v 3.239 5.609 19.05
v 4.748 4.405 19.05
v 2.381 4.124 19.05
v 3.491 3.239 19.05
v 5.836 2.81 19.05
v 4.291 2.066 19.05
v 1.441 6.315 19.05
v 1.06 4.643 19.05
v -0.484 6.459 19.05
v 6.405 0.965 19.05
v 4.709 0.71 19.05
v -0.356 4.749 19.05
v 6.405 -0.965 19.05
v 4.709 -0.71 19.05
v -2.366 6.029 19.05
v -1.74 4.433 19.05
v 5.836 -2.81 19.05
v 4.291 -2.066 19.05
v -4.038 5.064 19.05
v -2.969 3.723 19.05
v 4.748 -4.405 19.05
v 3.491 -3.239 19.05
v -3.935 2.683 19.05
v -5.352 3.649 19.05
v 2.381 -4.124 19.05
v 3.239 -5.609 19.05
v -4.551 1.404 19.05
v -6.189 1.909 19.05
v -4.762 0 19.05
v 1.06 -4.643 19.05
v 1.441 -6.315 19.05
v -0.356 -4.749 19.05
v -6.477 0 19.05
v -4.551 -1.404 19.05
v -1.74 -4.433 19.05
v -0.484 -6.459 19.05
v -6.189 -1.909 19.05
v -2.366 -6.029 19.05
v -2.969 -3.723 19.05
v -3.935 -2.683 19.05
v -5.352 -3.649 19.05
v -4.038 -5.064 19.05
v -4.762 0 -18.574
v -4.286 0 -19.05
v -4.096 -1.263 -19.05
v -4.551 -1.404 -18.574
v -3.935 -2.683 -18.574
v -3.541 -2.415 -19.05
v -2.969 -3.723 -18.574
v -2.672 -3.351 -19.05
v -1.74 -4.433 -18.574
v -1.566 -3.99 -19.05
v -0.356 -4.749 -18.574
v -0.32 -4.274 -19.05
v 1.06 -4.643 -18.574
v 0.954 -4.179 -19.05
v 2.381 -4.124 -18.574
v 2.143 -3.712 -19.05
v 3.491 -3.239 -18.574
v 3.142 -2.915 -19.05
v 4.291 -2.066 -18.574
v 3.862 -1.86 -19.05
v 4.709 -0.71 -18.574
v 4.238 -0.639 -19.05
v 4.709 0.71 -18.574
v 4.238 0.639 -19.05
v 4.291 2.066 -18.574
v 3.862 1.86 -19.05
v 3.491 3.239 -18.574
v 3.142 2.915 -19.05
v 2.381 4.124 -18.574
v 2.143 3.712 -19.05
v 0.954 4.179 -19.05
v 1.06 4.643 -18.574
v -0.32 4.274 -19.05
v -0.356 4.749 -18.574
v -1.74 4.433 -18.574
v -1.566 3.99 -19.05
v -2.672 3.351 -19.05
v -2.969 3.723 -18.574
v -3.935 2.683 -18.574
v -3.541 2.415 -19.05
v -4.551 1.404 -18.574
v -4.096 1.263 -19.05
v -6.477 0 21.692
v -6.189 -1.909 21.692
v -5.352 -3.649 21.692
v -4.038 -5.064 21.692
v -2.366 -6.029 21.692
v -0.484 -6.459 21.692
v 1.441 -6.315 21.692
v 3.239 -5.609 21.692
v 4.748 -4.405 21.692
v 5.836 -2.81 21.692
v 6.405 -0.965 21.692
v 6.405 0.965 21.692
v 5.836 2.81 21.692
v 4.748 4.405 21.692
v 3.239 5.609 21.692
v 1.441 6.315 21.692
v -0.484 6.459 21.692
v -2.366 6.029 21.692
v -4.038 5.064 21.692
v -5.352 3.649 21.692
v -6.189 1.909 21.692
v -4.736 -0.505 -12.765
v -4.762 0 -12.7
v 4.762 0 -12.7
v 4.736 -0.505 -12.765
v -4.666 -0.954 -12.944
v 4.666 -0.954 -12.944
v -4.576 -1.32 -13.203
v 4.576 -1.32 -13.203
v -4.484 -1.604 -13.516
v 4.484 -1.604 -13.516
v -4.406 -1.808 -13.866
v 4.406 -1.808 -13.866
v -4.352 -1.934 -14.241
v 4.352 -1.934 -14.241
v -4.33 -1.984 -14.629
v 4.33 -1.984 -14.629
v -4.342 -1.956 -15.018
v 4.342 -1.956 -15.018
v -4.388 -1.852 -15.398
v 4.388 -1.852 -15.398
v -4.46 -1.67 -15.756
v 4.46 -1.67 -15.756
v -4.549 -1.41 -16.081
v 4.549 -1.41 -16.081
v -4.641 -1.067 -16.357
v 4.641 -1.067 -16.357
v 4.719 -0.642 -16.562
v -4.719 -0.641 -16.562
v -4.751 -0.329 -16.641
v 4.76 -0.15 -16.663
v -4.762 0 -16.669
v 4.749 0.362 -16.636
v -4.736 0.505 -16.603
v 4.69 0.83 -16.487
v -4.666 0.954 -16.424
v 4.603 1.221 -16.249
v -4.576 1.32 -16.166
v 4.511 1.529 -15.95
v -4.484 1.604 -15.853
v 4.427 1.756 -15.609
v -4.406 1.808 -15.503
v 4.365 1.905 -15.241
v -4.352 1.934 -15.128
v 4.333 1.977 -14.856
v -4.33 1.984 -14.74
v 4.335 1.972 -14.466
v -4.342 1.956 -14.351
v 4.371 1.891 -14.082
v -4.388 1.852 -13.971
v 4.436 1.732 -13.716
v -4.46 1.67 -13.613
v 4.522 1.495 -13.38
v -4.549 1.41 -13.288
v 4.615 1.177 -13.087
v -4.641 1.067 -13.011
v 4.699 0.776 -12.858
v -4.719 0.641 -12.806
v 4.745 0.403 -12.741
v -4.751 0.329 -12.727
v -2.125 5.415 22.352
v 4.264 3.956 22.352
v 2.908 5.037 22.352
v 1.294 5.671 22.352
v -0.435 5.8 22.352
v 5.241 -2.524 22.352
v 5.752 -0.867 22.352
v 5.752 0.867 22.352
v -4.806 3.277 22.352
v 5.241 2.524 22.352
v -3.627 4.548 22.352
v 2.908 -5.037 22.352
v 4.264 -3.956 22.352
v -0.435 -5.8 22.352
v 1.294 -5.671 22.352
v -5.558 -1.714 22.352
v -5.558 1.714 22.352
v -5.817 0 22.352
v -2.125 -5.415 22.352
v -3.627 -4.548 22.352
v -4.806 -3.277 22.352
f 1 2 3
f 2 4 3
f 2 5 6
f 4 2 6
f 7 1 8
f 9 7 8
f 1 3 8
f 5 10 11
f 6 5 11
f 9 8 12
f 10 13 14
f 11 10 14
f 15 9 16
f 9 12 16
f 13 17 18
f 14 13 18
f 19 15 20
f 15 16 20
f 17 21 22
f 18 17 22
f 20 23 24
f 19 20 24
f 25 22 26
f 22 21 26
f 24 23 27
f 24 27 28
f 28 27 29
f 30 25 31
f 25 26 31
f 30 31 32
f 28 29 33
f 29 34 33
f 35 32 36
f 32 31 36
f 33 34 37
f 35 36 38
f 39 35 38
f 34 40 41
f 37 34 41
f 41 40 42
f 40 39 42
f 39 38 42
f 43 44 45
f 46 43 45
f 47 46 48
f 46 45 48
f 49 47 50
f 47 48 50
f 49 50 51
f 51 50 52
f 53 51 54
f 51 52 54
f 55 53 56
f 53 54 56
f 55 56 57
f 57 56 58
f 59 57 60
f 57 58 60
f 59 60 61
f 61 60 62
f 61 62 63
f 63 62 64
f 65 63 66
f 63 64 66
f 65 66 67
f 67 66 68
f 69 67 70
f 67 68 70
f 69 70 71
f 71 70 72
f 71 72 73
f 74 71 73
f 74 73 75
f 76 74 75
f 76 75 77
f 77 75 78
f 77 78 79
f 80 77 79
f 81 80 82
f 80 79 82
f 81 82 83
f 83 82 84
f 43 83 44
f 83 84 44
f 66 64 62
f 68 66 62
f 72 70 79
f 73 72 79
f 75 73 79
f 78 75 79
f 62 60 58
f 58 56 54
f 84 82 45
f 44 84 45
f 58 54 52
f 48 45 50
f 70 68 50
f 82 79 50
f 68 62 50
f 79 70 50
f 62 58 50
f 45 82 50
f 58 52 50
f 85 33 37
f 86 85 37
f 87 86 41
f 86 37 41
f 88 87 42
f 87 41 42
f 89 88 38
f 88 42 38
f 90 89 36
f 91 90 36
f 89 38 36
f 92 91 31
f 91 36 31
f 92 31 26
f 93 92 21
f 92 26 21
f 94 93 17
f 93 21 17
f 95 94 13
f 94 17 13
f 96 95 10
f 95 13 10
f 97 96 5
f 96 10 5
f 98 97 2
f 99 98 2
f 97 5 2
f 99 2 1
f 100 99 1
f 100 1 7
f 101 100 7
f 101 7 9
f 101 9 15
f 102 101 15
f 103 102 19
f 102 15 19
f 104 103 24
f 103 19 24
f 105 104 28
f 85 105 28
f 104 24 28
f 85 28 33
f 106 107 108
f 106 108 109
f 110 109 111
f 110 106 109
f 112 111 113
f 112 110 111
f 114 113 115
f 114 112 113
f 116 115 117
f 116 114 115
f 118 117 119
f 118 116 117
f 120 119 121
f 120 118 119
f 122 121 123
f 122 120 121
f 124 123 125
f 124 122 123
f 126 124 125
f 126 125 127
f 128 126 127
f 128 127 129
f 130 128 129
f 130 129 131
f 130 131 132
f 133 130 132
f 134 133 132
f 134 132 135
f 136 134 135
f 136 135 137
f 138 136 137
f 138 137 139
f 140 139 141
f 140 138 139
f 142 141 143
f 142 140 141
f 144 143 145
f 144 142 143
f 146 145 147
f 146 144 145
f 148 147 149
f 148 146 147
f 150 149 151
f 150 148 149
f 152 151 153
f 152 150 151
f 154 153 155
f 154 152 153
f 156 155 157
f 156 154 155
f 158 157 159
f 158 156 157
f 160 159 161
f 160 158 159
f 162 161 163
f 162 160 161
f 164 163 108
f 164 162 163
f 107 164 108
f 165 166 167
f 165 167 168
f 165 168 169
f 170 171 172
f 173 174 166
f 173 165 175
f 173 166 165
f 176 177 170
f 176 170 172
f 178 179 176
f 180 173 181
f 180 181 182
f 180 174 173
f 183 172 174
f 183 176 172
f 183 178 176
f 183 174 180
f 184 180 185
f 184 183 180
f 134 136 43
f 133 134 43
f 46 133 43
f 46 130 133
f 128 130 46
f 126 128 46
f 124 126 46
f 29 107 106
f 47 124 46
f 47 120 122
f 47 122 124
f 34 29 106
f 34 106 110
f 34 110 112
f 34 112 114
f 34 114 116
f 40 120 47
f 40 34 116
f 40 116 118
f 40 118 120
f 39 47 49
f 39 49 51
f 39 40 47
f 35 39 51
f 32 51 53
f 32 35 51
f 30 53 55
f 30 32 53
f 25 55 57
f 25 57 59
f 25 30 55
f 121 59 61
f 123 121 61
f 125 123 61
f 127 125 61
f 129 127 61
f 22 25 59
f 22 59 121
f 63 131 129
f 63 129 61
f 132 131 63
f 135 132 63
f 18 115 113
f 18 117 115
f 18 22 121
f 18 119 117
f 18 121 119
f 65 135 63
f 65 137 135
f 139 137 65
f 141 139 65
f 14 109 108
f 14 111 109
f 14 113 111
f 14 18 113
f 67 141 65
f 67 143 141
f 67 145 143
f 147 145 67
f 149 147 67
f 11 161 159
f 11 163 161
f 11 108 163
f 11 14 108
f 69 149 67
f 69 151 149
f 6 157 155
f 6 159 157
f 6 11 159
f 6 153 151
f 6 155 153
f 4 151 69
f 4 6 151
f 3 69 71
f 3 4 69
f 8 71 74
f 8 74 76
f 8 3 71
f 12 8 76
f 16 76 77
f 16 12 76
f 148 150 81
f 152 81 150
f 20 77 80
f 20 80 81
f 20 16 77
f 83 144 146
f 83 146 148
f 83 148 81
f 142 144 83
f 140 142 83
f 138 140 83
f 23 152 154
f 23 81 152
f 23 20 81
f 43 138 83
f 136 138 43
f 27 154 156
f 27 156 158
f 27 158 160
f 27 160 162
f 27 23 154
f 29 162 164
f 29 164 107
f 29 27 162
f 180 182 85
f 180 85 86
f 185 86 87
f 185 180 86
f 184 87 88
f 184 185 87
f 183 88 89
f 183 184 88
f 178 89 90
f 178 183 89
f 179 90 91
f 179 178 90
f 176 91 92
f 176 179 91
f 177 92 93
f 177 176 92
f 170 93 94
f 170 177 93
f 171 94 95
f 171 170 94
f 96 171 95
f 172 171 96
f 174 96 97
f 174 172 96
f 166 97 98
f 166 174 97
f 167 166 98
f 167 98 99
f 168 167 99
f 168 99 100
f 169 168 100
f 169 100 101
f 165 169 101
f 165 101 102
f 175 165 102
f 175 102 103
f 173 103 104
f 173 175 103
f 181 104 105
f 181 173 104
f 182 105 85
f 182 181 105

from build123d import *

# Parameters (mm, degrees)
SKETCH1_R           = 4.7625
EXTRUDE1_DEPTH      = 19.05
SKETCH2_R           = 6.477
EXTRUDE2_DEPTH      = 3.302
CHAMFER1_SIZE       = 0.6604
EXTRUDE3_DEPTH      = 25.156054355
EXTRUDE3_DEPTH_BACK = 25.156054355
SKETCH3_R           = 1.984375
CHAMFER2_SIZE       = 0.47625


with BuildPart() as part:
    # Sketch1 → Extrude1 (new, symmetric)
    with BuildSketch(Plane.XY):
        with Locations(Location((0, 0, 0), (0, 0, 180))):
            Circle(SKETCH1_R)
    extrude(amount=EXTRUDE1_DEPTH, both=True)

    # Sketch2 → Extrude2 (add)
    with BuildSketch(Plane.XY.offset(19.05)):
        with Locations(Location((0, 0, 0), (0, 0, 180))):
            Circle(SKETCH2_R)
    extrude(amount=EXTRUDE2_DEPTH)

    # Chamfer1
    chamfer1_edges = [part.edges().sort_by_distance(p)[0] for p in [
        (6.477, 0, 22.352),
    ]]
    chamfer(chamfer1_edges, length=CHAMFER1_SIZE)

    # Sketch3 → Extrude3 (cut, two sides: drawn at the far end of the back side and taken through both)
    with BuildSketch(Plane(origin=(0, 0, 0), x_dir=(0, 0, -1), z_dir=(1, 0, 0)).offset(-EXTRUDE3_DEPTH_BACK)):
        with Locations(Location((14.684375, 0, 0), (0, 0, 180.000000002))):
            Circle(SKETCH3_R)
    extrude(amount=EXTRUDE3_DEPTH + EXTRUDE3_DEPTH_BACK, mode=Mode.SUBTRACT)

    # Chamfer2
    chamfer2_edges = [part.edges().sort_by_distance(p)[0] for p in [
        (4.7625, 0, -19.05),
    ]]
    chamfer(chamfer2_edges, length=CHAMFER2_SIZE)


solid = part.part
